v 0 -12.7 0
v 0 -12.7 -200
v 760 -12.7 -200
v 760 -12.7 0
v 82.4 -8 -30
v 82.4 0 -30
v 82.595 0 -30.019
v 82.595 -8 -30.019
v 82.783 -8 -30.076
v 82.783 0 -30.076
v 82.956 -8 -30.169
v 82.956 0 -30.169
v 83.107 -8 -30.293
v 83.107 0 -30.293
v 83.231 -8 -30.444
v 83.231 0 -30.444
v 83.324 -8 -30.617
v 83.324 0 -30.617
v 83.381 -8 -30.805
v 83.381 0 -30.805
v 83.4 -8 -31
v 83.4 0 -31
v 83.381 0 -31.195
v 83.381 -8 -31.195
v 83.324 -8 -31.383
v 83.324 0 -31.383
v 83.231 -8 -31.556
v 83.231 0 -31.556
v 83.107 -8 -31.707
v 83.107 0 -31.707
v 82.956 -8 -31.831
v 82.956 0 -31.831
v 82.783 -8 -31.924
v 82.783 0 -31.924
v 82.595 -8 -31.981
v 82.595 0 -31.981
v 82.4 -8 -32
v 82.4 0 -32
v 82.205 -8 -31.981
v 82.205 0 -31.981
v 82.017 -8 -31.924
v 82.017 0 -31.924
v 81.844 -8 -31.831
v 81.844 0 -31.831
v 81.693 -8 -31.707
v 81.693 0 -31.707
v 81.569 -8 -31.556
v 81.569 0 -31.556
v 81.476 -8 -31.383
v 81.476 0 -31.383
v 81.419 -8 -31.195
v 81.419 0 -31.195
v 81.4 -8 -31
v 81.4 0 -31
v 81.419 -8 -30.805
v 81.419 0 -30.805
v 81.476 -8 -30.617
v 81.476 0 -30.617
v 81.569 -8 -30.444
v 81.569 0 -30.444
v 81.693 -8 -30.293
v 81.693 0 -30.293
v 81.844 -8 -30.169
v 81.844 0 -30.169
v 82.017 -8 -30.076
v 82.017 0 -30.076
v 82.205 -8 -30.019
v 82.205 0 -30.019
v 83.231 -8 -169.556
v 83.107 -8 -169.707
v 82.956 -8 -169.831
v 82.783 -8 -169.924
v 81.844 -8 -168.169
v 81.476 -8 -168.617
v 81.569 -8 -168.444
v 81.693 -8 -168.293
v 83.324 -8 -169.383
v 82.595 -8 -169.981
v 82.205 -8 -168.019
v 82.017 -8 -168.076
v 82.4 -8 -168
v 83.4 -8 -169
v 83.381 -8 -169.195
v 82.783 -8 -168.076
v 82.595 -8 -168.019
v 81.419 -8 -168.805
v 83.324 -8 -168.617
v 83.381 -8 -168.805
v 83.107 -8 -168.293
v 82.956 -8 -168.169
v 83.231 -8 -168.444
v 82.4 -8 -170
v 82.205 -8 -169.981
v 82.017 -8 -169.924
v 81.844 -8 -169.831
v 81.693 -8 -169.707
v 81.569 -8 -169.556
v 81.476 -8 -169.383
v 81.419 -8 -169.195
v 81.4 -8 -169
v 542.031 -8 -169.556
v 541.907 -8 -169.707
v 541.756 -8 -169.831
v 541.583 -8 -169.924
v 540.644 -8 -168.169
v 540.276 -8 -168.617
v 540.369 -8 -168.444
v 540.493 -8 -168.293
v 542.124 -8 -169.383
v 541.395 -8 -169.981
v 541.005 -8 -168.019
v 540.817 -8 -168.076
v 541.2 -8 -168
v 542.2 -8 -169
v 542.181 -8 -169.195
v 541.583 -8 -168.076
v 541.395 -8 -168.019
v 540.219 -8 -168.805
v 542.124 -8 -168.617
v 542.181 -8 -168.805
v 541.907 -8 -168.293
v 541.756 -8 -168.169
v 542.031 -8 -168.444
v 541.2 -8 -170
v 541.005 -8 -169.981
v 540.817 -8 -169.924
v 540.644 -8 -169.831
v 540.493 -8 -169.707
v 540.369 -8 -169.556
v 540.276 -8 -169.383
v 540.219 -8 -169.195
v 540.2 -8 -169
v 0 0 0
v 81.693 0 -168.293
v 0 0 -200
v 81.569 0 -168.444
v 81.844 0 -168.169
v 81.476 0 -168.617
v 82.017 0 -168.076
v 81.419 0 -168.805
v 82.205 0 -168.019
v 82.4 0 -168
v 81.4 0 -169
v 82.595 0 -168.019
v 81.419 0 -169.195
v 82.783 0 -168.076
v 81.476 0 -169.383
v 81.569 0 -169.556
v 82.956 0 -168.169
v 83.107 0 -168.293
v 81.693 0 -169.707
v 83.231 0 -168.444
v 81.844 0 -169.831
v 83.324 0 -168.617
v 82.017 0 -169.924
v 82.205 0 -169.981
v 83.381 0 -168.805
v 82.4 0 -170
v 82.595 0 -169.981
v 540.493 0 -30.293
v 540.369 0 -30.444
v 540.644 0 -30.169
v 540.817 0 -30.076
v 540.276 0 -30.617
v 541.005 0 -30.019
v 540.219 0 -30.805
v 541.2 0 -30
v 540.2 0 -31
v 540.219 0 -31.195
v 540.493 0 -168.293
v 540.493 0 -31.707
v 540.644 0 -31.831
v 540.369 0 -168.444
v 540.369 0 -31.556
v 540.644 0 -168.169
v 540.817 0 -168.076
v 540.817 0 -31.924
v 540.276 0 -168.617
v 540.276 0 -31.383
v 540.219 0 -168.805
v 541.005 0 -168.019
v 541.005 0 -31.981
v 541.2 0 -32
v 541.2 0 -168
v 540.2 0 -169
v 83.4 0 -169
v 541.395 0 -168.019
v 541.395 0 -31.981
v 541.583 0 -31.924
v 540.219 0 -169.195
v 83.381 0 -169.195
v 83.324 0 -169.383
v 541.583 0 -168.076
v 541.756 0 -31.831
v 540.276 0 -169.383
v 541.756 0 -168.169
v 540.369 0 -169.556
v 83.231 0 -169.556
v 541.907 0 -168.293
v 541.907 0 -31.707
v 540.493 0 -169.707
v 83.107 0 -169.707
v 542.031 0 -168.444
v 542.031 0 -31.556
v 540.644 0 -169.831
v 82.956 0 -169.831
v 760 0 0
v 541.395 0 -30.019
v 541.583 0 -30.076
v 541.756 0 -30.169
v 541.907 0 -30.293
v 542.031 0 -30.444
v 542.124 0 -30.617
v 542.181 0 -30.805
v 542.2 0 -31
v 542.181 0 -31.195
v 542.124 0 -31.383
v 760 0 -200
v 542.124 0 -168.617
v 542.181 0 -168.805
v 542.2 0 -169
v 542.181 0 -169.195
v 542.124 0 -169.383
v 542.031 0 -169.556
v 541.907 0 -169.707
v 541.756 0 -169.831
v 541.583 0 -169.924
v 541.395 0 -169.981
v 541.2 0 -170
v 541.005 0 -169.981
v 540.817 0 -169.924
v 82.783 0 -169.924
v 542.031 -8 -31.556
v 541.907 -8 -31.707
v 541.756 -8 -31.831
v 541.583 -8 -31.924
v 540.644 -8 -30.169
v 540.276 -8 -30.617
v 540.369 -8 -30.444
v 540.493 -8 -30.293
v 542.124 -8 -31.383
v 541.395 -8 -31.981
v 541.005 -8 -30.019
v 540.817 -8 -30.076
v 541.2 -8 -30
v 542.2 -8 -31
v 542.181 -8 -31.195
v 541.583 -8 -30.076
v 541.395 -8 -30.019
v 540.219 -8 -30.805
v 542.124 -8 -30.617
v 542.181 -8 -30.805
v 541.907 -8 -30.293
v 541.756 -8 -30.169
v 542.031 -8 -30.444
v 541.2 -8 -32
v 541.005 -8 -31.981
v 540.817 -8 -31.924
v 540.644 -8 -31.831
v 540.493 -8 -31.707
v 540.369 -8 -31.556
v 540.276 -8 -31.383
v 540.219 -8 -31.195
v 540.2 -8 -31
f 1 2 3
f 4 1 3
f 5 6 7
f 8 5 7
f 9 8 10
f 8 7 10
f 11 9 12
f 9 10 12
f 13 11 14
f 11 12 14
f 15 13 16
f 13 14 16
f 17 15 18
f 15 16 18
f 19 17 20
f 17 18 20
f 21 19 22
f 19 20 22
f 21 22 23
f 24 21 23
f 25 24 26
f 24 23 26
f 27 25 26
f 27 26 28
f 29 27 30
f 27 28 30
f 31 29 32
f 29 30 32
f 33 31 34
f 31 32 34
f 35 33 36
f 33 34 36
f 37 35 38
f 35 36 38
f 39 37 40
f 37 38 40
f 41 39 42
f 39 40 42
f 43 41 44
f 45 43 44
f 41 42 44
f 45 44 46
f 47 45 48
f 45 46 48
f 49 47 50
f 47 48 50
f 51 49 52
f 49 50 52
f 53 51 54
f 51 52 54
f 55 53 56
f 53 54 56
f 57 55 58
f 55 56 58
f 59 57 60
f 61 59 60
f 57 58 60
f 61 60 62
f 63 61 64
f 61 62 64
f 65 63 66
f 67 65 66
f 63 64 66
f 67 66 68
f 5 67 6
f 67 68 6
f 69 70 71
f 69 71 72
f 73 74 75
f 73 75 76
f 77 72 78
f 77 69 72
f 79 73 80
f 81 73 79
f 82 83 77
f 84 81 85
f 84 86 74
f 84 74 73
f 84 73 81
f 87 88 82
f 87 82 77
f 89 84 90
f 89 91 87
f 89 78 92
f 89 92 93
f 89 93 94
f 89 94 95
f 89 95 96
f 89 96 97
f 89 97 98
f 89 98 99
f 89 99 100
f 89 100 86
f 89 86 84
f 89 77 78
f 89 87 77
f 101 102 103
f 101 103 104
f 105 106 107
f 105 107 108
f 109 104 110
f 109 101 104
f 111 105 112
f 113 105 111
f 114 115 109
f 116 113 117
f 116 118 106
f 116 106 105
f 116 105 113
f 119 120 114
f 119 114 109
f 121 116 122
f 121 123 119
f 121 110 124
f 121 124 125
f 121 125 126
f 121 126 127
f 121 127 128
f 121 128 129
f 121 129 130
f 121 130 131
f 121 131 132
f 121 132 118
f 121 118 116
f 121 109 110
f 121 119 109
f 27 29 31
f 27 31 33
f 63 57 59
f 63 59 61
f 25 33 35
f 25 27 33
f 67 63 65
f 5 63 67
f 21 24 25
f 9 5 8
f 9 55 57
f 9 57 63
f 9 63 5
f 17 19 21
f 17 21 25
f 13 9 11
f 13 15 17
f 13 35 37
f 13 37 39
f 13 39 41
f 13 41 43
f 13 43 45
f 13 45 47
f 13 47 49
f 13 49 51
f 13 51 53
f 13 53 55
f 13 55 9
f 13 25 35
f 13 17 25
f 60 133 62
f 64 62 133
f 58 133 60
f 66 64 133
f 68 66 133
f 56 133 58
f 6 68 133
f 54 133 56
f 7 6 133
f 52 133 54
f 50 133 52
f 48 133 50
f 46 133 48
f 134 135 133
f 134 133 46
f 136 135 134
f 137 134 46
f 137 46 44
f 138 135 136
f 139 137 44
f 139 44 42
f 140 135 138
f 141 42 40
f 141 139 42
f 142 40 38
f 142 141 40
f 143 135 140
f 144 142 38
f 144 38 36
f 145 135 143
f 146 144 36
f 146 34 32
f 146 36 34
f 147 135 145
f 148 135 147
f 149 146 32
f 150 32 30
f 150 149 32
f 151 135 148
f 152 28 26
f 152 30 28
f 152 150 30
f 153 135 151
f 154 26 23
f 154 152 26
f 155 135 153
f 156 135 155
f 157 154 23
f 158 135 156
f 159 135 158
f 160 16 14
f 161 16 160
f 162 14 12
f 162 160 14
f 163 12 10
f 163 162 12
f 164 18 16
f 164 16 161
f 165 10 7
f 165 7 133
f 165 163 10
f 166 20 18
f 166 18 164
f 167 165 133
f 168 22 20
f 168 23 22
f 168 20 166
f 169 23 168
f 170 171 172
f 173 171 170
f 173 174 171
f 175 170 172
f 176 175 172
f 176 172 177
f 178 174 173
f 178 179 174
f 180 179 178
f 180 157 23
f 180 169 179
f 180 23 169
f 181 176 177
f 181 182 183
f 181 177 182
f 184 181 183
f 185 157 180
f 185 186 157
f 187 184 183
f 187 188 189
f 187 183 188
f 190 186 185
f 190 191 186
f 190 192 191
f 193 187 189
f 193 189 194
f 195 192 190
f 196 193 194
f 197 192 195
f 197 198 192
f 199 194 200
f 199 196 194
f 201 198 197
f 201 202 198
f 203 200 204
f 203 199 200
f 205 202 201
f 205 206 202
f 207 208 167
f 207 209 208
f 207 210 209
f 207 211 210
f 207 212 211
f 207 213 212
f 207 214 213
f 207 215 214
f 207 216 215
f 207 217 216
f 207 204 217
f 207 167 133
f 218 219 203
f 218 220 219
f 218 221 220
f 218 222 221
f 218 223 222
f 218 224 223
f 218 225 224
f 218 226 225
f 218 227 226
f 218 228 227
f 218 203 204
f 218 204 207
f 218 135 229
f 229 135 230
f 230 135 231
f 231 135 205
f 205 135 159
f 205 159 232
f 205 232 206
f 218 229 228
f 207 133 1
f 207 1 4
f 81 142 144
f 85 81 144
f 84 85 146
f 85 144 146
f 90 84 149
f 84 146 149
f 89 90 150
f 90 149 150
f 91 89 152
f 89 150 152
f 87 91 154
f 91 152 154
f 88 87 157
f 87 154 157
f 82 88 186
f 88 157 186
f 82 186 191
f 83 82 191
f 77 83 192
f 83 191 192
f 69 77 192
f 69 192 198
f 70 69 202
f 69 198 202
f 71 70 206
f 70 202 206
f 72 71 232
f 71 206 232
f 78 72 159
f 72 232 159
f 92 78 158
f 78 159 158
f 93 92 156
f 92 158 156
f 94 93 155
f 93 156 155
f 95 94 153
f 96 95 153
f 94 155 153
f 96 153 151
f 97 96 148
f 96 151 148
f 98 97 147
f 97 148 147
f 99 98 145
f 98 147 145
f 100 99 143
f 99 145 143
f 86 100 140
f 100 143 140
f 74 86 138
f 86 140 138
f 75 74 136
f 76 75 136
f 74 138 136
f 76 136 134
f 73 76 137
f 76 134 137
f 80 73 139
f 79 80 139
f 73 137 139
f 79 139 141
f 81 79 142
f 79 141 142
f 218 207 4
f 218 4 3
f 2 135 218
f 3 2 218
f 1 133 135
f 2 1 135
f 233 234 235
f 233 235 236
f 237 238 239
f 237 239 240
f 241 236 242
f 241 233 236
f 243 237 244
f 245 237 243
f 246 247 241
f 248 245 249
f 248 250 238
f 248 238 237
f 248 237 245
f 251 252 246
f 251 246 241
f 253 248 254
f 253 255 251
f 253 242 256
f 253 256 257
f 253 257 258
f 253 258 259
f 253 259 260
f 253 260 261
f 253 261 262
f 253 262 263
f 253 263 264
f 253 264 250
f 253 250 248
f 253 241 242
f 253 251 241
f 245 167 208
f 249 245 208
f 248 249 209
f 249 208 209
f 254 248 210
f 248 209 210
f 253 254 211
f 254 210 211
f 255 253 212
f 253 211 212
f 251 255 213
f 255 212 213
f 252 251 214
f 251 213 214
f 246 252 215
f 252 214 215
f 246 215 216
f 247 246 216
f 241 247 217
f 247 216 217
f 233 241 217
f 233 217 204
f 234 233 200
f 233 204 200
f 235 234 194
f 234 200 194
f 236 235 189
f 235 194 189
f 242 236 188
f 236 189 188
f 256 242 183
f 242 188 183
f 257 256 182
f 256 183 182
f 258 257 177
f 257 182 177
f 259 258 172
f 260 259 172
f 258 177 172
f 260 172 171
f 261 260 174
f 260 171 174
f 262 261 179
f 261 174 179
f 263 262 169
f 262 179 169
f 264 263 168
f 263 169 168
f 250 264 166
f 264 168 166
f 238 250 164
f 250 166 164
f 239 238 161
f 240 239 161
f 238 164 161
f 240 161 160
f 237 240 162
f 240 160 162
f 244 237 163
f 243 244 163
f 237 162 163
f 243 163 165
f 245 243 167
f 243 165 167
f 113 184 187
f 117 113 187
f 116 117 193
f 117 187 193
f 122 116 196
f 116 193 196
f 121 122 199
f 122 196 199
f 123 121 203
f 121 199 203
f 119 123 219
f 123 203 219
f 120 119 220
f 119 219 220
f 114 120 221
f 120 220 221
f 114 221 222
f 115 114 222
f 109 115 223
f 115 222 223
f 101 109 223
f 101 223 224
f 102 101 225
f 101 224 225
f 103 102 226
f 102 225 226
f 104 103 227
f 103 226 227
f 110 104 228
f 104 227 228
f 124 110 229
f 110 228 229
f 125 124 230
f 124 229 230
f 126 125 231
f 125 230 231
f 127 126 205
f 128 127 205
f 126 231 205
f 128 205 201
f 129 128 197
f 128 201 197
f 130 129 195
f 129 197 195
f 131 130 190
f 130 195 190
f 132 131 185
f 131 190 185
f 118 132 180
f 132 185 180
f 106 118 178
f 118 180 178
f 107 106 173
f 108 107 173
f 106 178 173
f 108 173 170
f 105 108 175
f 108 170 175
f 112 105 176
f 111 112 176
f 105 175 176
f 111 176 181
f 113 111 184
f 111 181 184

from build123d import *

# Parameters (mm, degrees)
SKETCH1_W           = 760
SKETCH1_H           = 200
BOSS_EXTRUDE1_DEPTH = 12.7
SKETCH2_R           = 1
CUT_EXTRUDE1_DEPTH  = 8


with BuildPart() as part:
    # Sketch1 → Boss-Extrude1 (new body)
    with BuildSketch(Plane(origin=(0, 0, 0), x_dir=(1, 0, 0), z_dir=(0, 1, 0))):
        with Locations((380, 100)):
            Rectangle(SKETCH1_W, SKETCH1_H)
    extrude(amount=-BOSS_EXTRUDE1_DEPTH)

    # Sketch2 → Cut-Extrude1 (cut)
    with BuildSketch(Plane(origin=(0, 0, 0), x_dir=(1, 0, 0), z_dir=(0, 1, 0))):
        with Locations(Location((82.4, 31, 0), (0, 0, 270))):  # turned: the seam where the file's is
            Circle(SKETCH2_R)
        with Locations(Location((82.4, 169, 0), (0, 0, 270))):  # turned: the seam where the file's is
            Circle(SKETCH2_R)
        with Locations(Location((541.2, 31, 0), (0, 0, 270))):  # turned: the seam where the file's is
            Circle(SKETCH2_R)
        with Locations(Location((541.2, 169, 0), (0, 0, 270))):  # turned: the seam where the file's is
            Circle(SKETCH2_R)
    extrude(amount=-CUT_EXTRUDE1_DEPTH, mode=Mode.SUBTRACT)


solid = part.part
